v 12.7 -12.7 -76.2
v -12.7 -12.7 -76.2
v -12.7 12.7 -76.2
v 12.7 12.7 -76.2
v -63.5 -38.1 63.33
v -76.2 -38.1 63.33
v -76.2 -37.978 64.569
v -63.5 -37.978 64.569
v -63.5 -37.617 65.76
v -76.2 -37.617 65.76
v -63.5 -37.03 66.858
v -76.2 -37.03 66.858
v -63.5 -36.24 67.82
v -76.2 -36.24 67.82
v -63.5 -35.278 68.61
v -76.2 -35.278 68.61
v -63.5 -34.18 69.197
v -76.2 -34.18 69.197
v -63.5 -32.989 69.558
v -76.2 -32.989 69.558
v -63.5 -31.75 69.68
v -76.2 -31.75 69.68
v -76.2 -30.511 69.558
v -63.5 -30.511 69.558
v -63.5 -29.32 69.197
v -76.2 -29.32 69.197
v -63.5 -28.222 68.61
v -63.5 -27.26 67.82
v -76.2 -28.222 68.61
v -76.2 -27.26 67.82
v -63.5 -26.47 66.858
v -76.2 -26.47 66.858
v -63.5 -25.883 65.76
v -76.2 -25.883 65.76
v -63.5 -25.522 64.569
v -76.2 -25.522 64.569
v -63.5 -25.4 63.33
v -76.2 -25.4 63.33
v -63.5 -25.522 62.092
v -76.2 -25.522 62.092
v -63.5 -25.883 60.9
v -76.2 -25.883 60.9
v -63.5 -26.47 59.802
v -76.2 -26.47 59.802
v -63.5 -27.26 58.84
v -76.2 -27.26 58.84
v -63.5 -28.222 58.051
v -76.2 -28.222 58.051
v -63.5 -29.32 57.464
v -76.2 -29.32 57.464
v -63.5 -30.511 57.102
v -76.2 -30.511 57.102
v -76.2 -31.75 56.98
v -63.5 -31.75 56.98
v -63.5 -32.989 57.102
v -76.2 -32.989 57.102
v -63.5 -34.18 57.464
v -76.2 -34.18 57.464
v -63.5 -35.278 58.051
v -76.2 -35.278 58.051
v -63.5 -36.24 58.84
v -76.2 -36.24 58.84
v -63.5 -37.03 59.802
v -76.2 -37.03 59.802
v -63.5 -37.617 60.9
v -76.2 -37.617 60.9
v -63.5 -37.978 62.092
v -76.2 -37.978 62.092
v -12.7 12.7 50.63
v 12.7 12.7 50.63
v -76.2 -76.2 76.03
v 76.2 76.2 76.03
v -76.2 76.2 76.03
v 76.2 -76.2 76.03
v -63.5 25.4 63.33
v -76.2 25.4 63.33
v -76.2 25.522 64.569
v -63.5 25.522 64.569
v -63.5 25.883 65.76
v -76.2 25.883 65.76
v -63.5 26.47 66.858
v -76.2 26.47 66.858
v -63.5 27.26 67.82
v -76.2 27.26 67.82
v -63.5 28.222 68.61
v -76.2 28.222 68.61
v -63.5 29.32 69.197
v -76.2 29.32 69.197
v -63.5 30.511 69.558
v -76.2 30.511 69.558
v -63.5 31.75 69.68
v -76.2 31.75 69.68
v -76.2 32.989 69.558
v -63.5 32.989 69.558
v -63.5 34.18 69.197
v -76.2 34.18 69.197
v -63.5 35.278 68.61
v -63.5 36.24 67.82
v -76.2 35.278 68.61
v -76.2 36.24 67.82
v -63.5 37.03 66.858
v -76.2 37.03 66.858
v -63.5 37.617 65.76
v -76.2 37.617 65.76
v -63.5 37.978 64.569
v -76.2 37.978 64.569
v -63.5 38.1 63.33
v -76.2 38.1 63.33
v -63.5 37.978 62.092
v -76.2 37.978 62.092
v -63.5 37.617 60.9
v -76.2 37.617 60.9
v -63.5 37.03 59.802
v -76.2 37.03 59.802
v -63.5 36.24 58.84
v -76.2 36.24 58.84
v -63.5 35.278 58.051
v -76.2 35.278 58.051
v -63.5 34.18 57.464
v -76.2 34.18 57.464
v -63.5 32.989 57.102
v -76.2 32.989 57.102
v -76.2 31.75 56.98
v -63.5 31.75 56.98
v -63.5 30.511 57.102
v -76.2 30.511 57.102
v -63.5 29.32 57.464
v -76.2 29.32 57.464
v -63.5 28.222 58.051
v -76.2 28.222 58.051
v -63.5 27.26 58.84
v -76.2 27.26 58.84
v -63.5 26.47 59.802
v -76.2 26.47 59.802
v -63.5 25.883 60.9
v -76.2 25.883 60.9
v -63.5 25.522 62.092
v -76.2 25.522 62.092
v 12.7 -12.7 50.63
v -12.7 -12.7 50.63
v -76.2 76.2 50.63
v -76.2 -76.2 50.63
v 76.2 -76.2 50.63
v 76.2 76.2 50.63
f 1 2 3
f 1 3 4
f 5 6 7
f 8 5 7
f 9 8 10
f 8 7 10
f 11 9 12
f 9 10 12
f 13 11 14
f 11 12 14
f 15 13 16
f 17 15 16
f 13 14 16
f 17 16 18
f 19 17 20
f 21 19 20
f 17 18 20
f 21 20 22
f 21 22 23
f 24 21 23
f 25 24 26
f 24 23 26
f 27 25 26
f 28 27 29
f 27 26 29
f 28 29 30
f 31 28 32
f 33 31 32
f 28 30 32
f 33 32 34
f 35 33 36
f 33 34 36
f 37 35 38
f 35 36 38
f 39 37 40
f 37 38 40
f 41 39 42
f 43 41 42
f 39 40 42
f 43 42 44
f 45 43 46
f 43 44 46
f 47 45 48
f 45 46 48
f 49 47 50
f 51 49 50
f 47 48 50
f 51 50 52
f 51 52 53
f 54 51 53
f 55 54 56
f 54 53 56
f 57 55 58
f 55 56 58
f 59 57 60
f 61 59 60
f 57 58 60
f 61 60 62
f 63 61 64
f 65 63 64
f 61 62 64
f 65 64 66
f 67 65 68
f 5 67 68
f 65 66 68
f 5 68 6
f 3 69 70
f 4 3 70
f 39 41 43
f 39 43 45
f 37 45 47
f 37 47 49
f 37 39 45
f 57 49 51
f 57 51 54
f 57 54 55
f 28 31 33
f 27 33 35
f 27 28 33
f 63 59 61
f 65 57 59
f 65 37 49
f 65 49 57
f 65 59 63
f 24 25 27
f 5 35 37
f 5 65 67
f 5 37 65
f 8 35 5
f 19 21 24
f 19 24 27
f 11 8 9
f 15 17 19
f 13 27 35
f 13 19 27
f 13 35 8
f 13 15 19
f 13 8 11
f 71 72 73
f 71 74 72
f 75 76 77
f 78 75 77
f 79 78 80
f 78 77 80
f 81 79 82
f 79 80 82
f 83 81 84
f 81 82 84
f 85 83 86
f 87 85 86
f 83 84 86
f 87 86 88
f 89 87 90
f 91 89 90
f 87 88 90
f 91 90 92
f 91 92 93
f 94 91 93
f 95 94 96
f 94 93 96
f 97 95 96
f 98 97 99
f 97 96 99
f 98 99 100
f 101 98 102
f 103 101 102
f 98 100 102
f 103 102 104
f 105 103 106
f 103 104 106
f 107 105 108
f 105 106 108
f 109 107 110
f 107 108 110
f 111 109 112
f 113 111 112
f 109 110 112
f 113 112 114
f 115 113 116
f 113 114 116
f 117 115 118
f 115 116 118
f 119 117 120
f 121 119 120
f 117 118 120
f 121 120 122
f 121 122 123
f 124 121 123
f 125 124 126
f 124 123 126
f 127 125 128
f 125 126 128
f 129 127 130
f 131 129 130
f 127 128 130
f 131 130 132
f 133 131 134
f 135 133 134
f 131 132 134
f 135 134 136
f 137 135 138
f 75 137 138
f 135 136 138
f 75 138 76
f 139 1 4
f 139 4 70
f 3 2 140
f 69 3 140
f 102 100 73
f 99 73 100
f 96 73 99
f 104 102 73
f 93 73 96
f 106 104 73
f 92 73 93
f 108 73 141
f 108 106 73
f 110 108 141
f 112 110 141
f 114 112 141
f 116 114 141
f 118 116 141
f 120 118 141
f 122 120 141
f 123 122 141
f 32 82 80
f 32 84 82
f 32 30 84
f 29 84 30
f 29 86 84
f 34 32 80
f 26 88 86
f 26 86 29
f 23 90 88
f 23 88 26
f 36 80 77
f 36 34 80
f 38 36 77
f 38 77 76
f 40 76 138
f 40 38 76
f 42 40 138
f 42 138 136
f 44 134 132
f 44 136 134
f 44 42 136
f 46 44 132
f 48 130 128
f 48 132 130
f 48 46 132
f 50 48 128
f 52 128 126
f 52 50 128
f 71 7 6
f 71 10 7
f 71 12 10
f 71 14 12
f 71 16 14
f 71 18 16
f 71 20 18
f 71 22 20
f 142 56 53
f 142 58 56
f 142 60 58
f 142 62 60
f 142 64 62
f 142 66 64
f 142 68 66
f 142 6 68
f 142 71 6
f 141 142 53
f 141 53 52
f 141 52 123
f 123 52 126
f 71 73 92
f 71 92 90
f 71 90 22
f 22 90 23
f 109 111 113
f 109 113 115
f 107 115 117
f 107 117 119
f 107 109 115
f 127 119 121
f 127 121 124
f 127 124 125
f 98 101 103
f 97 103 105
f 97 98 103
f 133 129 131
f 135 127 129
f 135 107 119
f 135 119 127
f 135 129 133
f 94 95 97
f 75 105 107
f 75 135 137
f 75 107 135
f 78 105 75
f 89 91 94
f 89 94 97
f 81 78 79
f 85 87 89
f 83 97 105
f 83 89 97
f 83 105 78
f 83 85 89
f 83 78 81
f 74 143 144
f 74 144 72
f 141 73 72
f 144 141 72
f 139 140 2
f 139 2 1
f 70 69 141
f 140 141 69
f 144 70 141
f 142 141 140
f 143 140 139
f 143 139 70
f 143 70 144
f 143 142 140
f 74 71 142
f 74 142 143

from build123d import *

# Parameters (mm, degrees)
F1_DEPTH = 76.2
F0_W     = 25.4
F0_H     = 126.830346
F2_DEPTH = 12.7
F3_R     = 6.35
F4_DEPTH = 12.7


with BuildPart() as f1:
    # F0 (on Front) → F1 (new body, symmetric)
    with BuildSketch(Plane.XZ):
        Polygon((12.7, 76.030346), (-12.7, 76.030346), (-76.2, 76.030346), (-76.2, 50.630346), (-12.7, 50.630346), (12.7, 50.630346), (76.2, 50.630346), (76.2, 76.030346), align=None)
    extrude(amount=F1_DEPTH, both=True)

    # F0 (on Front) → F2 (join, symmetric)
    with BuildSketch(Plane.XZ):
        with Locations((0, -12.784827)):
            Rectangle(F0_W, F0_H)
    extrude(amount=F2_DEPTH, both=True)

    # F3 (on face) → F4 (cut)
    with BuildSketch(Plane(origin=(-76.2, 0, 0), x_dir=(0, -1, 0), z_dir=(-1, 0, 0))):
        with Locations((31.75, 63.330346)):
            Circle(F3_R)
        with Locations((-31.75, 63.330346)):
            Circle(F3_R)
    extrude(amount=-F4_DEPTH, mode=Mode.SUBTRACT)


solid = f1.part
